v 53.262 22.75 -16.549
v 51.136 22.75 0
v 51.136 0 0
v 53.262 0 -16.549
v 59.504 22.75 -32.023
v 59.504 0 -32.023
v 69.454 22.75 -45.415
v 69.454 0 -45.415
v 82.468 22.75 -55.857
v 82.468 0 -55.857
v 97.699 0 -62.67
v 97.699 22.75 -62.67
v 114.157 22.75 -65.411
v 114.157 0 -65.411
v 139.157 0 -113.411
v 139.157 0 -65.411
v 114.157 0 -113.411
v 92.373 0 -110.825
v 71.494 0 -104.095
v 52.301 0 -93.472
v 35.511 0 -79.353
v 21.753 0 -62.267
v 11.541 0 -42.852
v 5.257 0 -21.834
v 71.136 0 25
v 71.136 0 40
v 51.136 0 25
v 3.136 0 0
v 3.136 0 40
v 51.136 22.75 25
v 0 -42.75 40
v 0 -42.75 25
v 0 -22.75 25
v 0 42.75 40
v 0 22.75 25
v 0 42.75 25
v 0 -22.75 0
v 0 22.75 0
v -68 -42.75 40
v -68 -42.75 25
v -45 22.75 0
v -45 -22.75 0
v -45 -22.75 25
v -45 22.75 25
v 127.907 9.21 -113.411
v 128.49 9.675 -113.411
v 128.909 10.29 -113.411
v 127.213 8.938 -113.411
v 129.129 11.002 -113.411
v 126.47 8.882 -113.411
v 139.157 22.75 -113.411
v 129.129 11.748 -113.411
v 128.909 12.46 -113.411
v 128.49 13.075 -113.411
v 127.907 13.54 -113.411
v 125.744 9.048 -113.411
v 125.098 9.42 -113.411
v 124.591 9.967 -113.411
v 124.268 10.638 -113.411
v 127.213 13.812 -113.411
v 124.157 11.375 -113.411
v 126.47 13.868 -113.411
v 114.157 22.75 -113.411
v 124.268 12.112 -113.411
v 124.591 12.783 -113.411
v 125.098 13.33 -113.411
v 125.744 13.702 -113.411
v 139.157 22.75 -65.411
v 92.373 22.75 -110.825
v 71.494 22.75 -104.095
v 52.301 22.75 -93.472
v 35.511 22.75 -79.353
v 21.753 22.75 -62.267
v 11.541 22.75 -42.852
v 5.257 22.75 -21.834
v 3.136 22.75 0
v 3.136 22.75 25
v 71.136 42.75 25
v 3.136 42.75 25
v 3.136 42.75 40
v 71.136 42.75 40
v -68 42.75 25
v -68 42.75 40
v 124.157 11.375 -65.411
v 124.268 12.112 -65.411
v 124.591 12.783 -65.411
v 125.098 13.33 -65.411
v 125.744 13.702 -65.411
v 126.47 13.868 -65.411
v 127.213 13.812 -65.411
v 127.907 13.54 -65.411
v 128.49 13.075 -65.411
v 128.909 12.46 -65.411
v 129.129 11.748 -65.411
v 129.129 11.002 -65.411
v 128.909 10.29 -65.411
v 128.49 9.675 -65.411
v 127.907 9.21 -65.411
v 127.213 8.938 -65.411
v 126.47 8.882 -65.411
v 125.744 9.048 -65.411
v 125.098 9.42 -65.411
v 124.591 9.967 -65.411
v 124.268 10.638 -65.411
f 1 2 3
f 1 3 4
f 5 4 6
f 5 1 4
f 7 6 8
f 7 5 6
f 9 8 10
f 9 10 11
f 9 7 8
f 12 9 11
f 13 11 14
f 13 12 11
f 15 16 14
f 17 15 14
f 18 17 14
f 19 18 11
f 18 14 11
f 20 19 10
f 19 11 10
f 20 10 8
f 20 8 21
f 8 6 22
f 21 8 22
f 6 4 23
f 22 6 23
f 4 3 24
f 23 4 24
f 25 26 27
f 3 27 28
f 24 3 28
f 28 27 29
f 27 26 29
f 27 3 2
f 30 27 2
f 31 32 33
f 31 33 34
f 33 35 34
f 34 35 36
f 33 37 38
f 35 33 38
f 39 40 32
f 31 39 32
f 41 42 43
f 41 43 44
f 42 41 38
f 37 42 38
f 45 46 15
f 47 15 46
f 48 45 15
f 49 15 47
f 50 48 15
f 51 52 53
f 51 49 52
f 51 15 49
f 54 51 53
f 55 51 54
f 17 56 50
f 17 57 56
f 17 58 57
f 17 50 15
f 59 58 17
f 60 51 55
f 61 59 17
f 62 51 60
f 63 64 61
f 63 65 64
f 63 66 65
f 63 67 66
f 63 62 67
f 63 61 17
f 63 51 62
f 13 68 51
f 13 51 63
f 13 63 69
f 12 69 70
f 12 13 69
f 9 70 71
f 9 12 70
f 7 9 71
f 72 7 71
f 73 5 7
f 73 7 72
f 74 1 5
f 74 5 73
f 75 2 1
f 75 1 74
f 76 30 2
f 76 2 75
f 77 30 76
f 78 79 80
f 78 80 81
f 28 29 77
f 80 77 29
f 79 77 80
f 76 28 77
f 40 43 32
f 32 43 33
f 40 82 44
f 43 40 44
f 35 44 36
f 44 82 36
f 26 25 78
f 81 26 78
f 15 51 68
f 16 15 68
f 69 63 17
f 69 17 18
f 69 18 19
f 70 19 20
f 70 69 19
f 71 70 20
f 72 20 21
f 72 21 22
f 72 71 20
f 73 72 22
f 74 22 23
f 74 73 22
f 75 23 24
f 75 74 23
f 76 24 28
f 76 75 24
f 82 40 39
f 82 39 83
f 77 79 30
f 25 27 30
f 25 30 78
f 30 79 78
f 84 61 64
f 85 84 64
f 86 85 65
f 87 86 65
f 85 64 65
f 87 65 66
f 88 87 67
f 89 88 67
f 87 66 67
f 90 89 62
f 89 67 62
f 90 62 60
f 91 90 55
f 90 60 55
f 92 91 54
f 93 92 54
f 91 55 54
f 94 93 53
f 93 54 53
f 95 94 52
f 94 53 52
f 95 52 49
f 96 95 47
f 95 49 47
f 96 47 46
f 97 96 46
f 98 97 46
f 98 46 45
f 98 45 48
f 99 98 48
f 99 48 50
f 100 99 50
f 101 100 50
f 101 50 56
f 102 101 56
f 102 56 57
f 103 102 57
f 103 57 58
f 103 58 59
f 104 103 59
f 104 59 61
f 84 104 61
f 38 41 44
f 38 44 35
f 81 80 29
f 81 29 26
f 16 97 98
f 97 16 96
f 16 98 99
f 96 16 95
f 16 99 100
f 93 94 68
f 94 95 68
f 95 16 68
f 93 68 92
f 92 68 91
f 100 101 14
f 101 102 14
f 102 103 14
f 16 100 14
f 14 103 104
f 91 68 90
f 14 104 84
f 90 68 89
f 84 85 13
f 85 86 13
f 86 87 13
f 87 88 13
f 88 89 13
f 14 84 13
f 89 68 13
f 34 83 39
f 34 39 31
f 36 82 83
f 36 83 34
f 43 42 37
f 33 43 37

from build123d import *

# Parameters (mm, degrees)
F0_W     = 45
F0_H     = 45.5
F1_DEPTH = 25
F0_W_2   = 48
F0_H_2   = 22.75
F2_W     = 68
F2_H     = 85.5
F3_DEPTH = 15
F4_W     = 68
F4_H     = 42.75
F5_DEPTH = 15
F6_W     = 25
F6_H     = 48
F7_DEPTH = 22.75
F9_D     = 5


with BuildPart() as f1:
    # F0 (on Top) → F1 (new body)
    with BuildSketch(Plane.XY):
        with Locations((-22.5, 0)):
            Rectangle(F0_W, F0_H)
    extrude(amount=F1_DEPTH)

    # F2 (on face) → F3 (join)
    with BuildSketch(Plane.XY.offset(25)):
        with Locations((-34, 0)):
            Rectangle(F2_W, F2_H)
    extrude(amount=F3_DEPTH)


with BuildPart() as f1b:
    # F0 (on Top) → F1, piece 2 (new body)
    with BuildSketch(Plane.XY):
        with Locations((27.1356669497, 11.375)):
            Rectangle(F0_W_2, F0_H_2)
    extrude(amount=F1_DEPTH)

    # F4 (on face) → F5 (join)
    with BuildSketch(Plane.XY.offset(25)):
        with Locations((37.1356669497, 21.375)):
            Rectangle(F4_W, F4_H)
    extrude(amount=F5_DEPTH)

    # F6 (on face) → F7 (join)
    with BuildSketch(Plane(origin=(0, 22.75, 0), x_dir=(-1, 0, 0), z_dir=(0, 1, 0))):
        with BuildLine():
            ThreePointArc((-51.1356669497, 0), (-69.4543816945, -45.4154488879), (-114.1570582986, -65.4106736183))
            Line((-114.1570582986, -65.4106736183), (-114.1570582986, -113.4106736183))
            ThreePointArc((-114.1570582986, -113.4106736183), (-35.5110824214, -79.3532139041), (-3.1356669497, 0))
            Line((-3.1356669497, 0), (-51.1356669497, 0))
        make_face()
        with Locations((-126.6570582986, -89.4106736183)):
            Rectangle(F6_W, F6_H)
    extrude(amount=-F7_DEPTH)

    # F9 (through all)
    with Locations(Plane.XY.offset(-65.4106736183)):
        with Locations((126.6570582986, 11.375)):
            Hole(F9_D / 2)


solid = Compound([f1.part, f1b.part])
